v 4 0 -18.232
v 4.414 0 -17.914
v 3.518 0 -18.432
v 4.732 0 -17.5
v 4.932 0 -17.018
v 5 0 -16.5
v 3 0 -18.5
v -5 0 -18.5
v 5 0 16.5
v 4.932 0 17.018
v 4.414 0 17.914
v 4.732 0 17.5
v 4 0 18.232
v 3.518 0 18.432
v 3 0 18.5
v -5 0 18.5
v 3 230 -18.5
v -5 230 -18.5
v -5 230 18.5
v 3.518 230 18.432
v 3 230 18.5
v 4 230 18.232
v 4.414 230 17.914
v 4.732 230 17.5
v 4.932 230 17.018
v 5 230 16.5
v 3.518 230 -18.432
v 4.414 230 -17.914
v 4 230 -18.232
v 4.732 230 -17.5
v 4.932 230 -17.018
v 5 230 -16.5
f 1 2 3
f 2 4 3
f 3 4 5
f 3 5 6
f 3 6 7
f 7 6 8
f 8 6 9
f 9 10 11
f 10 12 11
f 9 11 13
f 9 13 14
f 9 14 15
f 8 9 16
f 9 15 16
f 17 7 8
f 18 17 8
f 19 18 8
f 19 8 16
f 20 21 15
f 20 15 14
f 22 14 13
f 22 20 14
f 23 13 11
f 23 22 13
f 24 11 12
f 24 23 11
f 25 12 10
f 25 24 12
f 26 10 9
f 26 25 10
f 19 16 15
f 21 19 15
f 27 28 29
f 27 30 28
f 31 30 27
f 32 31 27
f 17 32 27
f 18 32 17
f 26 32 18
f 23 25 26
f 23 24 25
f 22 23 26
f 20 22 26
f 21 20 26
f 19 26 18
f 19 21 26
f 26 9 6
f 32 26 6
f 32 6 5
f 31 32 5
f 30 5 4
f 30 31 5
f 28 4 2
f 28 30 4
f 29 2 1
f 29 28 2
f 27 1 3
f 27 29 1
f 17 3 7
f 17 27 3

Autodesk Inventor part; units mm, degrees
ref_plane "YZ Plane" through (0, 0, 0) normal (1, 0, 0) x (0, 1, 0)
ref_plane "XZ Plane" through (0, 0, 0) normal (0, 1, 0) x (-1, 0, 0)
ref_plane "XY Plane" through (0, 0, 0) normal (0, 0, 1) x (1, 0, 0)
sketch "Эскиз1" plane through (0, 0, 0) normal (0, 1, 0) x (-1, 0, 0)
  line L0 (5, 18.5) -> (-5, 18.5)
  line L1 (-5, 18.5) -> (-5, -18.5)
  line L2 (-5, -18.5) -> (5, -18.5)
  line L3 (5, -18.5) -> (5, 18.5)
  line L4 (5, 18.5) -> (-5, -18.5) construction
  line L5 (-5, 18.5) -> (5, -18.5) construction
  point P0 (0, 0)
  dimension "d0" = 10
  dimension "d1" = 37
extrude "Выдавливание1" add sketch "Эскиз1" along normal blind 230
fillet "Сопряжение1" radius 2 2 edges at (5, 115, 18.5) (5, 115, -18.5)
properties part number "канал_проводов"
